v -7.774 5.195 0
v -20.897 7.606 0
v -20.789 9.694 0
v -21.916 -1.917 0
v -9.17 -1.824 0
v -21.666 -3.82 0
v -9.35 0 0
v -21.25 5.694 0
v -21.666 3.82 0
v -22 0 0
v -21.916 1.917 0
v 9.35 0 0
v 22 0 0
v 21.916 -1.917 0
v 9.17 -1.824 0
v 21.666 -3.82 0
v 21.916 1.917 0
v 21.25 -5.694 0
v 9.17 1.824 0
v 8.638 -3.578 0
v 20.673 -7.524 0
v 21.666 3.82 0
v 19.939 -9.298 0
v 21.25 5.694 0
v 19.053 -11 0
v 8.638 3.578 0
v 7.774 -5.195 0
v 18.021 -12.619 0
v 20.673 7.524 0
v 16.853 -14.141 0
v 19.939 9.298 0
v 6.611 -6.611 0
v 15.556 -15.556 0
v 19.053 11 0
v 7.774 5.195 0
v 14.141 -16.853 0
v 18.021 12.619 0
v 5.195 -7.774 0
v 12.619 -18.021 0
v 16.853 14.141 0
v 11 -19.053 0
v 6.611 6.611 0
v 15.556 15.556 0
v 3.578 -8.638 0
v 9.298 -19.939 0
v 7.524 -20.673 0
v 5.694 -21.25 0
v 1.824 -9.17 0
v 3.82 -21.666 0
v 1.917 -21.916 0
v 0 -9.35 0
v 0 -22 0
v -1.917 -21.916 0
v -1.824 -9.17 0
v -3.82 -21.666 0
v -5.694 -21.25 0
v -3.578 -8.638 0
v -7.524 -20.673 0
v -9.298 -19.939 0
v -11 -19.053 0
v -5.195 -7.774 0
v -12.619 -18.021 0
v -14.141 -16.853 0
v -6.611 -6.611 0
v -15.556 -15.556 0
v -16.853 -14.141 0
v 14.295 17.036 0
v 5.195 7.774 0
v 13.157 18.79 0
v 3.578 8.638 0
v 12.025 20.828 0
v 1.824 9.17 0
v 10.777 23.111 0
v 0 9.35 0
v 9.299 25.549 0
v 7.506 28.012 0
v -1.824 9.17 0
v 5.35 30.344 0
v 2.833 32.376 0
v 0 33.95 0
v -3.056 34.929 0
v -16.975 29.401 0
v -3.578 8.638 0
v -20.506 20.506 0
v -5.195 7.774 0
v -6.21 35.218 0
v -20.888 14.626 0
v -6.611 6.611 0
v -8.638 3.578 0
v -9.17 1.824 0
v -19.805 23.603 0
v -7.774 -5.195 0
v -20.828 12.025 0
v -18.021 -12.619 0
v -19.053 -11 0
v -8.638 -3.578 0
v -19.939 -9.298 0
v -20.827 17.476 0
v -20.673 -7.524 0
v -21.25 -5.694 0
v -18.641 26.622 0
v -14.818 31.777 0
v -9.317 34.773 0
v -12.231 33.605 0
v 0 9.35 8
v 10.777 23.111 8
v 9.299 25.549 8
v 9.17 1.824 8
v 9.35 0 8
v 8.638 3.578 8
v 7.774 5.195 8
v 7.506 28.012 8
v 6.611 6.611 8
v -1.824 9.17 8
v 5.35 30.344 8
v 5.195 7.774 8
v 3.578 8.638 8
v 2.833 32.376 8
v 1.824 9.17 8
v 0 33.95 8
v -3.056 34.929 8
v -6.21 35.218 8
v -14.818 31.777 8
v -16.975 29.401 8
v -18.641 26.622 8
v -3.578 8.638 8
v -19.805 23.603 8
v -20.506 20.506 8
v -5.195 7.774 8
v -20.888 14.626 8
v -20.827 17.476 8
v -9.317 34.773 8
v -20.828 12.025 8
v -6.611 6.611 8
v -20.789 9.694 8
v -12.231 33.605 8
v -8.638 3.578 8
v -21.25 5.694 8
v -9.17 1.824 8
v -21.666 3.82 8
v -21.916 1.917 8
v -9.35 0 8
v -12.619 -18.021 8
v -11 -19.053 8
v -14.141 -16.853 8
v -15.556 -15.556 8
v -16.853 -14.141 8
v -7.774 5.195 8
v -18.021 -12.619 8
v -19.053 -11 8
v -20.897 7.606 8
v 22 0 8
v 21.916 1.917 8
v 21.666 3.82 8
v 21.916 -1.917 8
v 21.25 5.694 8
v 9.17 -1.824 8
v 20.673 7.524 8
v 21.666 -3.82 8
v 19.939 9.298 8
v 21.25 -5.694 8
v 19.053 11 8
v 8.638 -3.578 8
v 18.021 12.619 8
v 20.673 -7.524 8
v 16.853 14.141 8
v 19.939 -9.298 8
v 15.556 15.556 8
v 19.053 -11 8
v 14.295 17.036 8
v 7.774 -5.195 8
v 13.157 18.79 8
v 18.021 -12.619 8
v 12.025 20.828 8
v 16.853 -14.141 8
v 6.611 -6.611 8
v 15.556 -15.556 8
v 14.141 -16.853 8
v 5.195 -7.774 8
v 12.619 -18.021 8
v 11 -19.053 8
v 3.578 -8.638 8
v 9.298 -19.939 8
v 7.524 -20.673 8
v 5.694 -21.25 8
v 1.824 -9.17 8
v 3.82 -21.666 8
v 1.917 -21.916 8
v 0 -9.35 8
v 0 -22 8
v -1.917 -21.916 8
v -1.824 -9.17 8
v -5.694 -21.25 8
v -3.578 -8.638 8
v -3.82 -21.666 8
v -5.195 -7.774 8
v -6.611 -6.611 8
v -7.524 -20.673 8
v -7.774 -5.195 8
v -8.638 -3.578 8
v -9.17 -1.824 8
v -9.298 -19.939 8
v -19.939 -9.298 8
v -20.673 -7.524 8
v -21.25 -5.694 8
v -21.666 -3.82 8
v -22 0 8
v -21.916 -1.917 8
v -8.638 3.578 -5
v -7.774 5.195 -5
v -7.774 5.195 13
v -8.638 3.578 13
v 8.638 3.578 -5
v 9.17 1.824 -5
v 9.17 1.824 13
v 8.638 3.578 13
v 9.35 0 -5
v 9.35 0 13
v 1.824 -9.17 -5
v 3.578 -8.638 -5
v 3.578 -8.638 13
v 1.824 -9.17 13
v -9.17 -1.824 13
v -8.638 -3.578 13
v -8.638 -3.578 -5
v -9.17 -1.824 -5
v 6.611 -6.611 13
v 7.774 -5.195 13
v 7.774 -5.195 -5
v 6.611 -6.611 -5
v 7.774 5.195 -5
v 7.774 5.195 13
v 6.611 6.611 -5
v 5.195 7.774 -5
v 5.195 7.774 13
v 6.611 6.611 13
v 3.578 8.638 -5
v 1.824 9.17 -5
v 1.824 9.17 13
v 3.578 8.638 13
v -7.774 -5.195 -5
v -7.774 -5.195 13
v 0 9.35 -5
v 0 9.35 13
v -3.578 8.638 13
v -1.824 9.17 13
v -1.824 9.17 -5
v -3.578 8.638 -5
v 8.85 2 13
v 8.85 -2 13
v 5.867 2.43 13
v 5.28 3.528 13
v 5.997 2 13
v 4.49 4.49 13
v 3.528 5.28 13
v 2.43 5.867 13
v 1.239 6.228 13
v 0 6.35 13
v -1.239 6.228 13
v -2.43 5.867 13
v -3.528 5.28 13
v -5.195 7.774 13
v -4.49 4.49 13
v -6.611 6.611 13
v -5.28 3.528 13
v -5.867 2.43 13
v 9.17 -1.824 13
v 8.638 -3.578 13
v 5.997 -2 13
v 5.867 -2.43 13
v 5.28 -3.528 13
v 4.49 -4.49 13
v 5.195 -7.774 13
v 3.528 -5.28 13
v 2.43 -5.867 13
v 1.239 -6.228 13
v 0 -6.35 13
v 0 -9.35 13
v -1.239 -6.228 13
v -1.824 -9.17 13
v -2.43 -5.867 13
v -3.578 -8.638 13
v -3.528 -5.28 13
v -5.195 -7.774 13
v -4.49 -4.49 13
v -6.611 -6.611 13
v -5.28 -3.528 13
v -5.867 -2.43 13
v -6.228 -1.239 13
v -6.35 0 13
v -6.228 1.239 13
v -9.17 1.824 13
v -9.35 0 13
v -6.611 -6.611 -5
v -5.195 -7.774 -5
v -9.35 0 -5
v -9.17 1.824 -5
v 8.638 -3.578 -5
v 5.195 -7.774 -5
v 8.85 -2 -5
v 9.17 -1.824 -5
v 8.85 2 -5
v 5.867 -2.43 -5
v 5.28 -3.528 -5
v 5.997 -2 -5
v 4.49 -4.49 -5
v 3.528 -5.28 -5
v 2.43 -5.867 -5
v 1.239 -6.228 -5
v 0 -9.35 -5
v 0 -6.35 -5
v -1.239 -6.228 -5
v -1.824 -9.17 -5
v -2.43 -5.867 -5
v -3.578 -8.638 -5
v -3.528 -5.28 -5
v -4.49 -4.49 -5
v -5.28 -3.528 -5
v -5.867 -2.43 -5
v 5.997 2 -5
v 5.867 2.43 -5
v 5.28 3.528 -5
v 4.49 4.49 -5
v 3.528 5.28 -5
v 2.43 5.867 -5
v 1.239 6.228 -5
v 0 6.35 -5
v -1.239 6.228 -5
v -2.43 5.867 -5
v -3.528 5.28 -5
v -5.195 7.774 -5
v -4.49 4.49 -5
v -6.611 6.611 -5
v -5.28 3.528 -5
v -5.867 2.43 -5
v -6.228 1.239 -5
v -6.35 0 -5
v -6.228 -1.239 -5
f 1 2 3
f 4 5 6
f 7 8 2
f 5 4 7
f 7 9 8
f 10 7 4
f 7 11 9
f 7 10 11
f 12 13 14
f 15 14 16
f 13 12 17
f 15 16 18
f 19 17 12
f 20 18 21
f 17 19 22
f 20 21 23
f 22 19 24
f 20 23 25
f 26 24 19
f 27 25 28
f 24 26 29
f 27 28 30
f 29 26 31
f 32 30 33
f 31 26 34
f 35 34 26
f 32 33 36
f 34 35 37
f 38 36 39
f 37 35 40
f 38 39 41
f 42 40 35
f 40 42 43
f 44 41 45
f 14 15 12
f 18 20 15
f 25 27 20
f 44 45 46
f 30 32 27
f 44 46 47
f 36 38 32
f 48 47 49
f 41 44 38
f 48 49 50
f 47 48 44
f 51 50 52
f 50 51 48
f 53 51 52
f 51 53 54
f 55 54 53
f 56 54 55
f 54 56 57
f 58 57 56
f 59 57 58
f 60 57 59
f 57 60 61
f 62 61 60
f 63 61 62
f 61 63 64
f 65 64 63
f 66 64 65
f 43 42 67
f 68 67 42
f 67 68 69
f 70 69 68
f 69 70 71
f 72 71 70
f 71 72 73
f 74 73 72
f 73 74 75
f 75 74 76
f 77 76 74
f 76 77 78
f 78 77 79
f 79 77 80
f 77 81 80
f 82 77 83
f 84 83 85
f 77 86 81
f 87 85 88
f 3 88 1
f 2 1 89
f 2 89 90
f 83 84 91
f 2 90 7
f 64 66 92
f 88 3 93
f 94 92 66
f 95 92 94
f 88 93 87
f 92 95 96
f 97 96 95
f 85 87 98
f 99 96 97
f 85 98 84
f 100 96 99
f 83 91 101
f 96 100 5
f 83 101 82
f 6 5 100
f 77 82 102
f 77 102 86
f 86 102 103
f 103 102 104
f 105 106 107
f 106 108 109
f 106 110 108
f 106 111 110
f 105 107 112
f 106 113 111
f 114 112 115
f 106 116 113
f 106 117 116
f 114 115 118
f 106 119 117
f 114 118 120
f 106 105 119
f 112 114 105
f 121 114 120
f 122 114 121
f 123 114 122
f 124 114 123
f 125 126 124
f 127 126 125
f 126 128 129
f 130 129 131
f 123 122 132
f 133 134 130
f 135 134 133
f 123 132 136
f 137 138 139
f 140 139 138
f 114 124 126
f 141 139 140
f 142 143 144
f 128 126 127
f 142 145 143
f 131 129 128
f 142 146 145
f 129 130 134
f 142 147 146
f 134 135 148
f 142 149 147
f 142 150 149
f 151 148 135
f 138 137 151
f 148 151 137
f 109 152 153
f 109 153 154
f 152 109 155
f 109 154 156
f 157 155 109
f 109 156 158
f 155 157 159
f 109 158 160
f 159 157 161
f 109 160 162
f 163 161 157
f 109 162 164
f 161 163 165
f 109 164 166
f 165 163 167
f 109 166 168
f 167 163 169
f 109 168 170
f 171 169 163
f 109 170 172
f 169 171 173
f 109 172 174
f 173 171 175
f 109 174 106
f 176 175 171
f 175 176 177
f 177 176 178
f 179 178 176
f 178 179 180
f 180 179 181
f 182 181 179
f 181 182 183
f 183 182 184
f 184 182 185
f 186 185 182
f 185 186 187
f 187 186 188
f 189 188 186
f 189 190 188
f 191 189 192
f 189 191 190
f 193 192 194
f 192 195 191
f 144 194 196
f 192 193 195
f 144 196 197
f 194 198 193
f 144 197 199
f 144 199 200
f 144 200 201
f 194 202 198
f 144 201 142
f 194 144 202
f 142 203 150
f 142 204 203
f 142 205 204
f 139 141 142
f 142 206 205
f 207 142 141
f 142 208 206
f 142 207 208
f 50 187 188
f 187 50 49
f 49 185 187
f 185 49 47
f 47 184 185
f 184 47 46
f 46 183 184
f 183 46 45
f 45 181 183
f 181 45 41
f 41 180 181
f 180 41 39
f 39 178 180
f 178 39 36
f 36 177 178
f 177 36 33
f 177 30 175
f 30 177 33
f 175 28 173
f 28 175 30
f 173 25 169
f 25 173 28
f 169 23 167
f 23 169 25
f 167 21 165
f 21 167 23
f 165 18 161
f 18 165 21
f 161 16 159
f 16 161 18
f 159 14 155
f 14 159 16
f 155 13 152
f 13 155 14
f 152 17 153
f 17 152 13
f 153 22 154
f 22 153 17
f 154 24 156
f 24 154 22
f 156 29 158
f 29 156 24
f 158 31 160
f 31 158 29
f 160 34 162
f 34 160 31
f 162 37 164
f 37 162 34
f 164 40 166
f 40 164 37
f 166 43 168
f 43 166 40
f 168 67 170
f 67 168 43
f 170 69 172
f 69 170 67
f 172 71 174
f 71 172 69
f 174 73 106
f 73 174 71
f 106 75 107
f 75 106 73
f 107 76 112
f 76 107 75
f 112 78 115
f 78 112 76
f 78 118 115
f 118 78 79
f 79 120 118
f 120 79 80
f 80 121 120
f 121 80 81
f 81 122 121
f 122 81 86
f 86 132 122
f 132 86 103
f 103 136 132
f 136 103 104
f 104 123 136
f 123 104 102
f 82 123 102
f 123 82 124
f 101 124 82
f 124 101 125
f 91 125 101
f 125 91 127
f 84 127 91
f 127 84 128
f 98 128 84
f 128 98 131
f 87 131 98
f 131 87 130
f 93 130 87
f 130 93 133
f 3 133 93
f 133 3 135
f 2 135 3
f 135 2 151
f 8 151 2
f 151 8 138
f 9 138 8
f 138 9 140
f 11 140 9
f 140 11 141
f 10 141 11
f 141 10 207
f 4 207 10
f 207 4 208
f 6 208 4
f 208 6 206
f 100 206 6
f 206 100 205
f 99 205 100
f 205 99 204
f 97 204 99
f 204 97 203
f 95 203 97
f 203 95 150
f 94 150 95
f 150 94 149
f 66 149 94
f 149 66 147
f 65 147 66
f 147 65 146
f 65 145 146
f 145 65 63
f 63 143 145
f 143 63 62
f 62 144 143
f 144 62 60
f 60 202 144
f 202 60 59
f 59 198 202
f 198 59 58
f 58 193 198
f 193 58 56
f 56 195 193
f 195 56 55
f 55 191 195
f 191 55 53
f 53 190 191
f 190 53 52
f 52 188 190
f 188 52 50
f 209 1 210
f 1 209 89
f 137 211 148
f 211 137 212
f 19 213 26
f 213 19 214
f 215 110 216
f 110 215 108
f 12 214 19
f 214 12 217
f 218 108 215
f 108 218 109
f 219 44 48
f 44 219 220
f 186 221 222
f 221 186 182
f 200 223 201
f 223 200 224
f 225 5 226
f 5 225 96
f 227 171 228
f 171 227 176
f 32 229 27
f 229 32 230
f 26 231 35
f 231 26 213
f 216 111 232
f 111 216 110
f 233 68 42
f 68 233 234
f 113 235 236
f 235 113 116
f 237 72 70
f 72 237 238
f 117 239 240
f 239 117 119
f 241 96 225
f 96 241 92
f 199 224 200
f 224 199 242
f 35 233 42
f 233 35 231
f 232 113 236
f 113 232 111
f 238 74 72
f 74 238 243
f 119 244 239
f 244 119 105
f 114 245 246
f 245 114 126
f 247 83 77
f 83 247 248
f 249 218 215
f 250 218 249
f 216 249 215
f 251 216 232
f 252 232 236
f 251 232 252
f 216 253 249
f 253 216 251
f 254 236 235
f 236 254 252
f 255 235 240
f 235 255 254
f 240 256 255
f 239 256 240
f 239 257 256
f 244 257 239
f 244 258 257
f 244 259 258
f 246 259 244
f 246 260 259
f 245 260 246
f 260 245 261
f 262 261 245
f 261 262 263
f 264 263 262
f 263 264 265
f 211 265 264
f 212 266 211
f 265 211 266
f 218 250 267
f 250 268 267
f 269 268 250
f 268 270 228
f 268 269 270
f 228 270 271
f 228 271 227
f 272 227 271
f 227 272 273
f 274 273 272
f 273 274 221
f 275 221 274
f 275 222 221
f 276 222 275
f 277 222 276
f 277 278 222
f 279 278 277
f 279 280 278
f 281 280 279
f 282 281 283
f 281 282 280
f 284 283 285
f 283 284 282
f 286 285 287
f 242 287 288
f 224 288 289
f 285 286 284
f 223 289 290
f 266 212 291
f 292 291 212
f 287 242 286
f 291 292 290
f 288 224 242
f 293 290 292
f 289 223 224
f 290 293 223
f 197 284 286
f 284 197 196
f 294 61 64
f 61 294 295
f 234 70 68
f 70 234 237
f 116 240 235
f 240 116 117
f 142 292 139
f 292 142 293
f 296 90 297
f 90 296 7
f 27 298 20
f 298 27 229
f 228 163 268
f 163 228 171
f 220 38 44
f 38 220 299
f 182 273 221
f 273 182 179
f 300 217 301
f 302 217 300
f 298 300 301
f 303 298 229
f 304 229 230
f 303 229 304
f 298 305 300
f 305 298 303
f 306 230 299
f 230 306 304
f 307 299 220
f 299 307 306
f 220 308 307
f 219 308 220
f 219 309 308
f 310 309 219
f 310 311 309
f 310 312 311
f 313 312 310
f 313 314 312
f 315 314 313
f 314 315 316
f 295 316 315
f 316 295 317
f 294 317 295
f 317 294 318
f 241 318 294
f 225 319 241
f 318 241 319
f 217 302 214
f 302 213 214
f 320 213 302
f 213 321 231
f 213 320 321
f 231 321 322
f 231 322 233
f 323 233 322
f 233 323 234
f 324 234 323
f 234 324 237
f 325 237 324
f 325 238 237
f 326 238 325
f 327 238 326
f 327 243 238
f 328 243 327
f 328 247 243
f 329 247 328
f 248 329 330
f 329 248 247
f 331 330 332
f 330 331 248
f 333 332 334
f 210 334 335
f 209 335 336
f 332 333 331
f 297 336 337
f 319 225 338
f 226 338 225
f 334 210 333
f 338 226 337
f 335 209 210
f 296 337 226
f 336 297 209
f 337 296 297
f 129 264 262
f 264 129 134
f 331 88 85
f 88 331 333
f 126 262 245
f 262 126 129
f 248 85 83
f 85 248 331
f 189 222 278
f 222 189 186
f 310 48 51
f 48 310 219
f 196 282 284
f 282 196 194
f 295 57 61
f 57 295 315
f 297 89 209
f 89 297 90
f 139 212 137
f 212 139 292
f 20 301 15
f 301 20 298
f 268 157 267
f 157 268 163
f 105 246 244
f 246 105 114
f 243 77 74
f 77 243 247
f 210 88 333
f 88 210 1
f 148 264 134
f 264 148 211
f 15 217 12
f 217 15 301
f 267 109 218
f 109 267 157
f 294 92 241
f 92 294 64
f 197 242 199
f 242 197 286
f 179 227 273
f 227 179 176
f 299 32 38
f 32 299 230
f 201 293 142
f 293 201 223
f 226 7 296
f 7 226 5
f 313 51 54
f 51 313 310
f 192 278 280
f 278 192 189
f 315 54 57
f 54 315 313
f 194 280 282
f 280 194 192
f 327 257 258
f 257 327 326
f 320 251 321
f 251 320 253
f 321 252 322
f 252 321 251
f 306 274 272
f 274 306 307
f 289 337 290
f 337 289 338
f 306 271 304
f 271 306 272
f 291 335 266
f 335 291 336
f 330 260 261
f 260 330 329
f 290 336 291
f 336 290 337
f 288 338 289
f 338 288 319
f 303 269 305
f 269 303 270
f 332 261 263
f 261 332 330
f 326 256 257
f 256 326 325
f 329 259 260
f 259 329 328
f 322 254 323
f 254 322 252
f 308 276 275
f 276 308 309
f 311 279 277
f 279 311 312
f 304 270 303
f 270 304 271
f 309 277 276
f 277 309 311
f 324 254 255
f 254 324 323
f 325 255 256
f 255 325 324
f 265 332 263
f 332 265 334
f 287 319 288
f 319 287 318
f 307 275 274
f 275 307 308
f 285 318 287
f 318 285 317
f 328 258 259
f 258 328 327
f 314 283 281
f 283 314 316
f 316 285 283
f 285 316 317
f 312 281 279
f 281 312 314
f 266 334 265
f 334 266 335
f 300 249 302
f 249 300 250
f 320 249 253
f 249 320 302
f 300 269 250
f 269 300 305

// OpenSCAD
$fn = 32;

// ----------------------------------------------------------------------
// Cam: base radius 22 mm with a 14 mm lift over 120 degrees
// ----------------------------------------------------------------------

// --- parameters (mm) ---
base_r = 22;              // base radius
lift = 14;                // lift height above the base radius
lift_span = 120;          // angular width of the lift
lift_start = 45;          // angle where the lift starts
cam_t = 8;                // cam plate thickness
hub_d = 18.7;             // hub diameter
hub_h = 18;               // hub height
bore_d = 12.7;            // bore
key_w = 4;                // keyway width
key_depth = 1.6;          // keyway depth

cam_profile = [[22, 0], [21.916, 1.917], [21.666, 3.82], [21.25, 5.694], [20.673, 7.524], [19.939, 9.298], [19.053, 11], [18.021, 12.619], [16.853, 14.141], [15.556, 15.556], [14.295, 17.036], [13.157, 18.79], [12.025, 20.828], [10.777, 23.111], [9.299, 25.549], [7.506, 28.012], [5.35, 30.344], [2.833, 32.376], [0, 33.95], [-3.056, 34.929], [-6.21, 35.218], [-9.317, 34.773], [-12.231, 33.605], [-14.818, 31.777], [-16.975, 29.401], [-18.641, 26.622], [-19.805, 23.603], [-20.506, 20.506], [-20.827, 17.476], [-20.888, 14.626], [-20.828, 12.025], [-20.789, 9.694], [-20.897, 7.606], [-21.25, 5.694], [-21.666, 3.82], [-21.916, 1.917], [-22, 0], [-21.916, -1.917], [-21.666, -3.82], [-21.25, -5.694], [-20.673, -7.524], [-19.939, -9.298], [-19.053, -11], [-18.021, -12.619], [-16.853, -14.141], [-15.556, -15.556], [-14.141, -16.853], [-12.619, -18.021], [-11, -19.053], [-9.298, -19.939], [-7.524, -20.673], [-5.694, -21.25], [-3.82, -21.666], [-1.917, -21.916], [0, -22], [1.917, -21.916], [3.82, -21.666], [5.694, -21.25], [7.524, -20.673], [9.298, -19.939], [11, -19.053], [12.619, -18.021], [14.141, -16.853], [15.556, -15.556], [16.853, -14.141], [18.021, -12.619], [19.053, -11], [19.939, -9.298], [20.673, -7.524], [21.25, -5.694], [21.666, -3.82], [21.916, -1.917]];

difference() {
  union() {
    linear_extrude(height = cam_t) polygon(cam_profile);
    /* hub, proud of the cam plate on both sides */
    translate([0, 0, -5]) cylinder(h = hub_h, d = hub_d);
  }
  /* bore through the hub, 2.5 mm clear on both faces */
  translate([0, 0, -7.5]) cylinder(h = hub_h + 5, d = bore_d);
  /* keyway, milled through the whole hub */
  translate([4.75, -2, -7.5]) cube([4.1, 4, 23]);
}
